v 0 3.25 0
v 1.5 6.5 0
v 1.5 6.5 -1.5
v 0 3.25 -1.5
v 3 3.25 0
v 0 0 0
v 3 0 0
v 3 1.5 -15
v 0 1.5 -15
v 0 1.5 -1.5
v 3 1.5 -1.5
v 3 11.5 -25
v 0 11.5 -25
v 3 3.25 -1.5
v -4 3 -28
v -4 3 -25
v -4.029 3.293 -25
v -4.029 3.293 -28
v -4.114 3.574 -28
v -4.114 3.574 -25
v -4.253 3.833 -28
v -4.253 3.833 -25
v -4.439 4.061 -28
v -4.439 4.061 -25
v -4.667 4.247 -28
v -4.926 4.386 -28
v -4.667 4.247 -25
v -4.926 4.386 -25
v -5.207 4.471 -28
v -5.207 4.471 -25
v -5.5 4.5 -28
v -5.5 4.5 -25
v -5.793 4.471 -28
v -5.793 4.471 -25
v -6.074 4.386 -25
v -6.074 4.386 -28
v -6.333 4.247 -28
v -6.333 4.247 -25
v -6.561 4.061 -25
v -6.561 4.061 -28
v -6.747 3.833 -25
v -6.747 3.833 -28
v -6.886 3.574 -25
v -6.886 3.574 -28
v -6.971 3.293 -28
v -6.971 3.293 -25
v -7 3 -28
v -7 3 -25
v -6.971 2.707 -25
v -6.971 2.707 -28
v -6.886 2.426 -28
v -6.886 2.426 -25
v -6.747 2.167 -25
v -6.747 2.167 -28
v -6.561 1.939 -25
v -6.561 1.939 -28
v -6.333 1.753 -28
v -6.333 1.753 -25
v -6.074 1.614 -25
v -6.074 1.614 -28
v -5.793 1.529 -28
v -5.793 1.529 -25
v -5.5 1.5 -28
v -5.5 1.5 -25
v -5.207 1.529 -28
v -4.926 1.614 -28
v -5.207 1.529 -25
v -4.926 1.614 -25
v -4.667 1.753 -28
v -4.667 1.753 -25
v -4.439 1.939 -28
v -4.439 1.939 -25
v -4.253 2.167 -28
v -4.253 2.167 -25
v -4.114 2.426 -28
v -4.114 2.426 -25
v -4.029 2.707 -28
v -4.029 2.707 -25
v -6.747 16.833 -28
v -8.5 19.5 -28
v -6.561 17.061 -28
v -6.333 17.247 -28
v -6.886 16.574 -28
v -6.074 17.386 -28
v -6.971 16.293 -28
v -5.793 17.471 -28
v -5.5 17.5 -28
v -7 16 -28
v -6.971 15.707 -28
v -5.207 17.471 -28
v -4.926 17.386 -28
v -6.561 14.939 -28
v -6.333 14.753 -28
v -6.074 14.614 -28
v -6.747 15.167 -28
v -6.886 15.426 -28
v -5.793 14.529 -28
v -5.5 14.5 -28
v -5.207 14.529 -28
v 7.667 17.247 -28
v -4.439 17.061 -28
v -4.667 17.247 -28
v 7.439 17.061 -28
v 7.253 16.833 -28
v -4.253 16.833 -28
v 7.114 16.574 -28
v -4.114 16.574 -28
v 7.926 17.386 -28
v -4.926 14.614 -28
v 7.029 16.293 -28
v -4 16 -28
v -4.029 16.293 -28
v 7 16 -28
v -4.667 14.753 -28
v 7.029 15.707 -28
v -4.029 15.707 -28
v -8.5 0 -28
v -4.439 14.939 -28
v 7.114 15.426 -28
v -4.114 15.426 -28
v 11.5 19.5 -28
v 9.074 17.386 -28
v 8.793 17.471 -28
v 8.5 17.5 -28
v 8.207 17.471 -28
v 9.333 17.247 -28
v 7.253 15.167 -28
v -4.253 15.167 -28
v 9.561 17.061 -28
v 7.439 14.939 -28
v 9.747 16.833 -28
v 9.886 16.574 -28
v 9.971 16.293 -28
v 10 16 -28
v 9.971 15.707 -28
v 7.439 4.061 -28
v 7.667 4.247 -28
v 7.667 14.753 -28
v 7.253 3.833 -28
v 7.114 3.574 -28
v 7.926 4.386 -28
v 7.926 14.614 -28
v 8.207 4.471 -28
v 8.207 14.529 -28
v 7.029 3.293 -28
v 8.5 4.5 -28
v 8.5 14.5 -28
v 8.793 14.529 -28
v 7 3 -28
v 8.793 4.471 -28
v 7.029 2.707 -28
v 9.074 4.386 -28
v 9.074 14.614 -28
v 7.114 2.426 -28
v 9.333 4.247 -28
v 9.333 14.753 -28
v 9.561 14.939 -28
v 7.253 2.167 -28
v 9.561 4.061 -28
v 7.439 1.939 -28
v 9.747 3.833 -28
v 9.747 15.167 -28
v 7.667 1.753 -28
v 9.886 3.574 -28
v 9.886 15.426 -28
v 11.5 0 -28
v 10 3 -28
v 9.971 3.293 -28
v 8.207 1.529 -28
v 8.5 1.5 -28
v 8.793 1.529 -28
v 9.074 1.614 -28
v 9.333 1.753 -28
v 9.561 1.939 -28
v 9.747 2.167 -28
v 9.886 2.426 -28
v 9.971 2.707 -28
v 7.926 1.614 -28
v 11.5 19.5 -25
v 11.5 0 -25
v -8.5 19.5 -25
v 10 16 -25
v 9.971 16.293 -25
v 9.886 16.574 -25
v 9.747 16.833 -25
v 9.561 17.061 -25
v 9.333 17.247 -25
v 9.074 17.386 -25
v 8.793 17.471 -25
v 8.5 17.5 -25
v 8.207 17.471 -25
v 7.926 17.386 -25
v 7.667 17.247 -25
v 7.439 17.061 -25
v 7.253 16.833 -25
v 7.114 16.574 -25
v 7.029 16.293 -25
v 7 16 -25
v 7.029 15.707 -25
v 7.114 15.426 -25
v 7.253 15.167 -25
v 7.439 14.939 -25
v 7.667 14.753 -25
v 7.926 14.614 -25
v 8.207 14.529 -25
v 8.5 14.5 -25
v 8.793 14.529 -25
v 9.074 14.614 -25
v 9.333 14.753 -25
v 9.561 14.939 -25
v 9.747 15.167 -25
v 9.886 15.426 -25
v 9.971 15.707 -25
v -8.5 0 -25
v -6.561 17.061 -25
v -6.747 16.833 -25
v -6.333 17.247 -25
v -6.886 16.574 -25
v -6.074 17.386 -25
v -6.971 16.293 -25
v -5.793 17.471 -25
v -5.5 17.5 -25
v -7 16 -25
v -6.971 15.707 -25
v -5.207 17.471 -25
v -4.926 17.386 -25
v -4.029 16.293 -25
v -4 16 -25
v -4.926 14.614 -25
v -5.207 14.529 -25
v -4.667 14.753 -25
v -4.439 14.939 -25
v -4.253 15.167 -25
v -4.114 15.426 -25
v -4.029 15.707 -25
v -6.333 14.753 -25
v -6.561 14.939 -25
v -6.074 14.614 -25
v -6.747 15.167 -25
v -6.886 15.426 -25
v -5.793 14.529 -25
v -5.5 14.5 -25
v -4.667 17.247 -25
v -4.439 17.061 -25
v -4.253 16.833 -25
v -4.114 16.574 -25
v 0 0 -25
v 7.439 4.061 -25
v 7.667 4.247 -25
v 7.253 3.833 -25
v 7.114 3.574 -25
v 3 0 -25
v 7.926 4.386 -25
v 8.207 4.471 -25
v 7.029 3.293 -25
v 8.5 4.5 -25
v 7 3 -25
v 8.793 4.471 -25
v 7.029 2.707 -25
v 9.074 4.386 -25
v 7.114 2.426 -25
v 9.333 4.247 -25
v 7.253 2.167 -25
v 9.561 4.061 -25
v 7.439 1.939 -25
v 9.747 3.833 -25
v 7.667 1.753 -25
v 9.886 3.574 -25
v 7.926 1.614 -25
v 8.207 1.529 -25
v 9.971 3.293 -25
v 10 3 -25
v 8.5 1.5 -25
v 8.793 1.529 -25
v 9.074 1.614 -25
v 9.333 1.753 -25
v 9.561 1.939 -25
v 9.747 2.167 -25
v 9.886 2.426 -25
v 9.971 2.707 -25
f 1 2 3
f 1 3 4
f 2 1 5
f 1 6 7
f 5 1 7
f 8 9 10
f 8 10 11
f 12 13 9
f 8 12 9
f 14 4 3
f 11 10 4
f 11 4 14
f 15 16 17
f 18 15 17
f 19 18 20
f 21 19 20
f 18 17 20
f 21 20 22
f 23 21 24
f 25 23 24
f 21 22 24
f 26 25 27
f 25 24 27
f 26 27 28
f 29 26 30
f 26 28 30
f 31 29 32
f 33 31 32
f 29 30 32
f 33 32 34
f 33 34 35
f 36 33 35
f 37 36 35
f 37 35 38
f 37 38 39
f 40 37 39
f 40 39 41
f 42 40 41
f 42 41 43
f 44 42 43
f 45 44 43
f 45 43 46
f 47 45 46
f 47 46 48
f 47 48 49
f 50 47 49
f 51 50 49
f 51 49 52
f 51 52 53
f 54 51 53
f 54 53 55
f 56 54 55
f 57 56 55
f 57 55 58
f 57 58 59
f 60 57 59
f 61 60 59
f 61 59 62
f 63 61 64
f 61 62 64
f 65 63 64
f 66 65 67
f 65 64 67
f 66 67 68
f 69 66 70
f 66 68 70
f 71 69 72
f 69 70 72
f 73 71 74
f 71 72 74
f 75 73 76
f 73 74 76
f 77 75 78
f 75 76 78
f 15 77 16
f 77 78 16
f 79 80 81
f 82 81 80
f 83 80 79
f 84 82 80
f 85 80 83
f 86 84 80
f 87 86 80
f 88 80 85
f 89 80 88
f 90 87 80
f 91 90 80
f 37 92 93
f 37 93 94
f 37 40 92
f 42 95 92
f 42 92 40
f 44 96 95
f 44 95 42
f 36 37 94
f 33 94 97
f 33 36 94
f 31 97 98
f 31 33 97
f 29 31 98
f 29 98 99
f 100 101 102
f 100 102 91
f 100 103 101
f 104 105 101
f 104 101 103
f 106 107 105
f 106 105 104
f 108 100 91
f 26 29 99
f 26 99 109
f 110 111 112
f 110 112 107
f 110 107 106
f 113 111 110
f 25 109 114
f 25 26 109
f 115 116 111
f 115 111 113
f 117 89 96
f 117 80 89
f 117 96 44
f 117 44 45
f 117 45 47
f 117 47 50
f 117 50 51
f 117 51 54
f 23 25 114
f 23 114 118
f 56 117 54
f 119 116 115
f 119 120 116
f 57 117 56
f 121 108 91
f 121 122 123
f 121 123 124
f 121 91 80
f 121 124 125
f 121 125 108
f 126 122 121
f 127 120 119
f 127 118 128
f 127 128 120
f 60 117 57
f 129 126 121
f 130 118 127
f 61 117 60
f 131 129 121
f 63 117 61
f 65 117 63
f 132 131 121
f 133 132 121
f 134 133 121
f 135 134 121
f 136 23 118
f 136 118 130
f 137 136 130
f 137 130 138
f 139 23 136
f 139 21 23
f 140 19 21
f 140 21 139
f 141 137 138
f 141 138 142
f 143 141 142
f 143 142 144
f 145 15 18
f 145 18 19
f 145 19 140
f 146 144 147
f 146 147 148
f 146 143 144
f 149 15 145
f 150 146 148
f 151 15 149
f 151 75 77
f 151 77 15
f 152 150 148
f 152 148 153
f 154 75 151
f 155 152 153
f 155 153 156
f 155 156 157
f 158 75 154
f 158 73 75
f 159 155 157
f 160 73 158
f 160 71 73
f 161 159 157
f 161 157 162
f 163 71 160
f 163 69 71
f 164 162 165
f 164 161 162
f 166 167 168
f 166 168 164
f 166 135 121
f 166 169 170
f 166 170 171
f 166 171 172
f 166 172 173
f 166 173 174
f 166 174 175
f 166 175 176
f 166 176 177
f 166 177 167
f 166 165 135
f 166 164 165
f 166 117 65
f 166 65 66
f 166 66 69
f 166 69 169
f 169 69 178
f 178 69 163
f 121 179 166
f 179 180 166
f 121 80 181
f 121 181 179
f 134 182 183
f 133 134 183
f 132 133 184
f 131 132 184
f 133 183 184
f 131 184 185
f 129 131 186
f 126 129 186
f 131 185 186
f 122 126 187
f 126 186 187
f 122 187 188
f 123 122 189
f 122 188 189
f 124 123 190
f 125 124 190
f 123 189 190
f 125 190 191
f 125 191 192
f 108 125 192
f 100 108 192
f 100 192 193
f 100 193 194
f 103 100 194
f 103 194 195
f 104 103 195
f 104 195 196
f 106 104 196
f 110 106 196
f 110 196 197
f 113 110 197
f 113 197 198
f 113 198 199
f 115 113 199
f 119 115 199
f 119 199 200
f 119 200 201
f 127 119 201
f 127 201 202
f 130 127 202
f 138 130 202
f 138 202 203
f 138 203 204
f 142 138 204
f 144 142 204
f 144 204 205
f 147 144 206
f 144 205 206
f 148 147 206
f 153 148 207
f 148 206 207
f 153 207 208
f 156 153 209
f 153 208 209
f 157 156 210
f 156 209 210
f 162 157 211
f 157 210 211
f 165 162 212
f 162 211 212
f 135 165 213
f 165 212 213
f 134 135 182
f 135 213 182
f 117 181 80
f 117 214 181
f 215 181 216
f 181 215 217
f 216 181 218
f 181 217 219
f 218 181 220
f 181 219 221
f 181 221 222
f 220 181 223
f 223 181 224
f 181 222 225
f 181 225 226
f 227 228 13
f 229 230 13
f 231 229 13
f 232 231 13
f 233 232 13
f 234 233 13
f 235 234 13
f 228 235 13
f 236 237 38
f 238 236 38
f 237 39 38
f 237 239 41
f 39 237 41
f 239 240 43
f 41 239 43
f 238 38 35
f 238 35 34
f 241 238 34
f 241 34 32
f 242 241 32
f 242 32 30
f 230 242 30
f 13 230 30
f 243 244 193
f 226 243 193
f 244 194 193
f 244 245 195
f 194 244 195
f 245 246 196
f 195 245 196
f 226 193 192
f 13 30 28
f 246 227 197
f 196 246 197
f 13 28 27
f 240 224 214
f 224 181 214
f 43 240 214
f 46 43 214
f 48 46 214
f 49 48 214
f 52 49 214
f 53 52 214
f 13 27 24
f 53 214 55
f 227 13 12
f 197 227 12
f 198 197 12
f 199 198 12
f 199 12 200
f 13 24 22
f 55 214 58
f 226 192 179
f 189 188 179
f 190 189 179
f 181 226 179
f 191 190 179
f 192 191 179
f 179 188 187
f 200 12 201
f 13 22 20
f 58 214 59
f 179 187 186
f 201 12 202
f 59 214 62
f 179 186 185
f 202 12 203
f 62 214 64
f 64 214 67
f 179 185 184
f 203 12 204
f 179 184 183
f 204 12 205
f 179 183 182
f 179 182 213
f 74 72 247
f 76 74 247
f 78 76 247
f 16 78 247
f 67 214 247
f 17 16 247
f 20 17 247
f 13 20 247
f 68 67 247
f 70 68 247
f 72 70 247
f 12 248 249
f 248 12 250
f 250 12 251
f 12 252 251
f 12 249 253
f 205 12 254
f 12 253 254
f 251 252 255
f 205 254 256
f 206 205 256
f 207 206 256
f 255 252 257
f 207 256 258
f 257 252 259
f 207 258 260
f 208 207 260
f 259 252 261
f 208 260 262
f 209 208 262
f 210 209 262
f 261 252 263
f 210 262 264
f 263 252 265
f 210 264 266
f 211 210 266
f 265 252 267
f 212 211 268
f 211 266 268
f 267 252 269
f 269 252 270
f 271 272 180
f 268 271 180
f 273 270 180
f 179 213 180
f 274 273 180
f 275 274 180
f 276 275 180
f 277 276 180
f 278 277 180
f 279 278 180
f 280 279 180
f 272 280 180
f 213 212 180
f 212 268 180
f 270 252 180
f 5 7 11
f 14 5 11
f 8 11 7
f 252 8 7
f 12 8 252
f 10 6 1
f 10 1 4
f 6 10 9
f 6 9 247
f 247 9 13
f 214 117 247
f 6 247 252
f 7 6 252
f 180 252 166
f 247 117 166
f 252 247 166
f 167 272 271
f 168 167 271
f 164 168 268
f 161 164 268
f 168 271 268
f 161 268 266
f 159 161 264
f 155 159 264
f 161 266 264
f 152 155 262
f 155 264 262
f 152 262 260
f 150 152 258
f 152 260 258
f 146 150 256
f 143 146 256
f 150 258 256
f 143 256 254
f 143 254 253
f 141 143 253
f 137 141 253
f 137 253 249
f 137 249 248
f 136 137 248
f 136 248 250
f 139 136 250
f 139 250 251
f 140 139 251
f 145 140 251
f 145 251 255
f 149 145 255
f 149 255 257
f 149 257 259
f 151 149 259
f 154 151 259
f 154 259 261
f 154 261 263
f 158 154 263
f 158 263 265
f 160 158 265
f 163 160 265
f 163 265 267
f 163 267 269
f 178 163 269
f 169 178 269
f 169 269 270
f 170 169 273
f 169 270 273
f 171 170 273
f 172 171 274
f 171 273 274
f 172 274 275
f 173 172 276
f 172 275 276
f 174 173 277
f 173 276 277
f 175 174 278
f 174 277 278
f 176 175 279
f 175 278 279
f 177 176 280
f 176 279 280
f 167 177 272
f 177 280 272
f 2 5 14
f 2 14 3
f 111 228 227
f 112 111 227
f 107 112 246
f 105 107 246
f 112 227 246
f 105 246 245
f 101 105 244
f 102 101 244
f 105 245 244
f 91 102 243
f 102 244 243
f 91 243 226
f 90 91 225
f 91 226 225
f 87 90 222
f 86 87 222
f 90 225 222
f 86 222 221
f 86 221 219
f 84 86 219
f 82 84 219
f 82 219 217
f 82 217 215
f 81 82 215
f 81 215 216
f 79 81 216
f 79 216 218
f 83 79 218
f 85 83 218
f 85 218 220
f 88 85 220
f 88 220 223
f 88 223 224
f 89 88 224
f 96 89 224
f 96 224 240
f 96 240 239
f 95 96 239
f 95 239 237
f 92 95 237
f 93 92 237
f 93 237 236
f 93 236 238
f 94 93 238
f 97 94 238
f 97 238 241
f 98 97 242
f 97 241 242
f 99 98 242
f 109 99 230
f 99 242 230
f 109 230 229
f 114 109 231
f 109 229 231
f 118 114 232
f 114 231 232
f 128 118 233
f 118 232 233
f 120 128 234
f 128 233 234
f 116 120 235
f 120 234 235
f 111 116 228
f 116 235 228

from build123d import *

# Parameters (mm, degrees)
BOSS_EXTRUDE1_DEPTH = 1.5
SKETCH2_W           = 3
SKETCH2_H           = 1.5
BOSS_EXTRUDE2_DEPTH = 5
SKETCH3_W           = 20
SKETCH3_H           = 3
BOSS_EXTRUDE3_DEPTH = 18
CUT_EXTRUDE1_DEPTH  = 10
SKETCH5_R           = 1.5
CUT_EXTRUDE4_DEPTH  = 10
BOSS_EXTRUDE4_DEPTH = 3


with BuildPart() as part:
    # Sketch1 → Boss-Extrude1 (new body)
    with BuildSketch(Plane(origin=(0, 0, 0), x_dir=(1, 0, 0), z_dir=(0, 1, 0))):
        Polygon((3, 25), (11.5, 25), (11.5, 28), (-8.5, 28), (-8.5, 25), (0, 25), (0, 0), (3, 0), align=None)
    extrude(amount=BOSS_EXTRUDE1_DEPTH)

    # Sketch2 → Boss-Extrude2 (add)
    with BuildSketch(Plane(origin=(0, 1.5, 0), x_dir=(1, 0, 0), z_dir=(0, 1, 0))):
        with Locations((1.5, 0.75)):
            Rectangle(SKETCH2_W, SKETCH2_H)
    extrude(amount=BOSS_EXTRUDE2_DEPTH)

    # Sketch3 → Boss-Extrude3 (add)
    with BuildSketch(Plane(origin=(0, 1.5, 0), x_dir=(1, 0, 0), z_dir=(0, 1, 0))):
        with Locations((1.5, 26.5)):
            Rectangle(SKETCH3_W, SKETCH3_H)
    extrude(amount=BOSS_EXTRUDE3_DEPTH)

    # Sketch4 → Cut-Extrude1 (cut)
    with BuildSketch(Plane.XY):
        Polygon((1.5, 6.5), (0, 3.25), (-1.660876249, 3.25), (-2.026223081, 8.127487576), (5.302958893, 8.676477884), (5.709427688, 3.25), (3, 3.25), align=None)
    extrude(amount=-CUT_EXTRUDE1_DEPTH, mode=Mode.SUBTRACT)

    # Sketch5 → Cut-Extrude4 (cut)
    with BuildSketch(Plane.XY.offset(-25)):
        with Locations((-5.5, 3)):
            Circle(SKETCH5_R)
        with Locations((8.5, 3)):
            Circle(SKETCH5_R)
        with Locations((8.5, 16)):
            Circle(SKETCH5_R)
        with Locations((-5.5, 16)):
            Circle(SKETCH5_R)
    extrude(amount=-CUT_EXTRUDE4_DEPTH, mode=Mode.SUBTRACT)

    # Sketch6 → Boss-Extrude4 (add)
    with BuildSketch(Plane.ZY):
        Polygon((-25, 1.5), (-25, 11.5), (-15, 1.5), align=None)
    extrude(amount=-BOSS_EXTRUDE4_DEPTH)


solid = part.part
